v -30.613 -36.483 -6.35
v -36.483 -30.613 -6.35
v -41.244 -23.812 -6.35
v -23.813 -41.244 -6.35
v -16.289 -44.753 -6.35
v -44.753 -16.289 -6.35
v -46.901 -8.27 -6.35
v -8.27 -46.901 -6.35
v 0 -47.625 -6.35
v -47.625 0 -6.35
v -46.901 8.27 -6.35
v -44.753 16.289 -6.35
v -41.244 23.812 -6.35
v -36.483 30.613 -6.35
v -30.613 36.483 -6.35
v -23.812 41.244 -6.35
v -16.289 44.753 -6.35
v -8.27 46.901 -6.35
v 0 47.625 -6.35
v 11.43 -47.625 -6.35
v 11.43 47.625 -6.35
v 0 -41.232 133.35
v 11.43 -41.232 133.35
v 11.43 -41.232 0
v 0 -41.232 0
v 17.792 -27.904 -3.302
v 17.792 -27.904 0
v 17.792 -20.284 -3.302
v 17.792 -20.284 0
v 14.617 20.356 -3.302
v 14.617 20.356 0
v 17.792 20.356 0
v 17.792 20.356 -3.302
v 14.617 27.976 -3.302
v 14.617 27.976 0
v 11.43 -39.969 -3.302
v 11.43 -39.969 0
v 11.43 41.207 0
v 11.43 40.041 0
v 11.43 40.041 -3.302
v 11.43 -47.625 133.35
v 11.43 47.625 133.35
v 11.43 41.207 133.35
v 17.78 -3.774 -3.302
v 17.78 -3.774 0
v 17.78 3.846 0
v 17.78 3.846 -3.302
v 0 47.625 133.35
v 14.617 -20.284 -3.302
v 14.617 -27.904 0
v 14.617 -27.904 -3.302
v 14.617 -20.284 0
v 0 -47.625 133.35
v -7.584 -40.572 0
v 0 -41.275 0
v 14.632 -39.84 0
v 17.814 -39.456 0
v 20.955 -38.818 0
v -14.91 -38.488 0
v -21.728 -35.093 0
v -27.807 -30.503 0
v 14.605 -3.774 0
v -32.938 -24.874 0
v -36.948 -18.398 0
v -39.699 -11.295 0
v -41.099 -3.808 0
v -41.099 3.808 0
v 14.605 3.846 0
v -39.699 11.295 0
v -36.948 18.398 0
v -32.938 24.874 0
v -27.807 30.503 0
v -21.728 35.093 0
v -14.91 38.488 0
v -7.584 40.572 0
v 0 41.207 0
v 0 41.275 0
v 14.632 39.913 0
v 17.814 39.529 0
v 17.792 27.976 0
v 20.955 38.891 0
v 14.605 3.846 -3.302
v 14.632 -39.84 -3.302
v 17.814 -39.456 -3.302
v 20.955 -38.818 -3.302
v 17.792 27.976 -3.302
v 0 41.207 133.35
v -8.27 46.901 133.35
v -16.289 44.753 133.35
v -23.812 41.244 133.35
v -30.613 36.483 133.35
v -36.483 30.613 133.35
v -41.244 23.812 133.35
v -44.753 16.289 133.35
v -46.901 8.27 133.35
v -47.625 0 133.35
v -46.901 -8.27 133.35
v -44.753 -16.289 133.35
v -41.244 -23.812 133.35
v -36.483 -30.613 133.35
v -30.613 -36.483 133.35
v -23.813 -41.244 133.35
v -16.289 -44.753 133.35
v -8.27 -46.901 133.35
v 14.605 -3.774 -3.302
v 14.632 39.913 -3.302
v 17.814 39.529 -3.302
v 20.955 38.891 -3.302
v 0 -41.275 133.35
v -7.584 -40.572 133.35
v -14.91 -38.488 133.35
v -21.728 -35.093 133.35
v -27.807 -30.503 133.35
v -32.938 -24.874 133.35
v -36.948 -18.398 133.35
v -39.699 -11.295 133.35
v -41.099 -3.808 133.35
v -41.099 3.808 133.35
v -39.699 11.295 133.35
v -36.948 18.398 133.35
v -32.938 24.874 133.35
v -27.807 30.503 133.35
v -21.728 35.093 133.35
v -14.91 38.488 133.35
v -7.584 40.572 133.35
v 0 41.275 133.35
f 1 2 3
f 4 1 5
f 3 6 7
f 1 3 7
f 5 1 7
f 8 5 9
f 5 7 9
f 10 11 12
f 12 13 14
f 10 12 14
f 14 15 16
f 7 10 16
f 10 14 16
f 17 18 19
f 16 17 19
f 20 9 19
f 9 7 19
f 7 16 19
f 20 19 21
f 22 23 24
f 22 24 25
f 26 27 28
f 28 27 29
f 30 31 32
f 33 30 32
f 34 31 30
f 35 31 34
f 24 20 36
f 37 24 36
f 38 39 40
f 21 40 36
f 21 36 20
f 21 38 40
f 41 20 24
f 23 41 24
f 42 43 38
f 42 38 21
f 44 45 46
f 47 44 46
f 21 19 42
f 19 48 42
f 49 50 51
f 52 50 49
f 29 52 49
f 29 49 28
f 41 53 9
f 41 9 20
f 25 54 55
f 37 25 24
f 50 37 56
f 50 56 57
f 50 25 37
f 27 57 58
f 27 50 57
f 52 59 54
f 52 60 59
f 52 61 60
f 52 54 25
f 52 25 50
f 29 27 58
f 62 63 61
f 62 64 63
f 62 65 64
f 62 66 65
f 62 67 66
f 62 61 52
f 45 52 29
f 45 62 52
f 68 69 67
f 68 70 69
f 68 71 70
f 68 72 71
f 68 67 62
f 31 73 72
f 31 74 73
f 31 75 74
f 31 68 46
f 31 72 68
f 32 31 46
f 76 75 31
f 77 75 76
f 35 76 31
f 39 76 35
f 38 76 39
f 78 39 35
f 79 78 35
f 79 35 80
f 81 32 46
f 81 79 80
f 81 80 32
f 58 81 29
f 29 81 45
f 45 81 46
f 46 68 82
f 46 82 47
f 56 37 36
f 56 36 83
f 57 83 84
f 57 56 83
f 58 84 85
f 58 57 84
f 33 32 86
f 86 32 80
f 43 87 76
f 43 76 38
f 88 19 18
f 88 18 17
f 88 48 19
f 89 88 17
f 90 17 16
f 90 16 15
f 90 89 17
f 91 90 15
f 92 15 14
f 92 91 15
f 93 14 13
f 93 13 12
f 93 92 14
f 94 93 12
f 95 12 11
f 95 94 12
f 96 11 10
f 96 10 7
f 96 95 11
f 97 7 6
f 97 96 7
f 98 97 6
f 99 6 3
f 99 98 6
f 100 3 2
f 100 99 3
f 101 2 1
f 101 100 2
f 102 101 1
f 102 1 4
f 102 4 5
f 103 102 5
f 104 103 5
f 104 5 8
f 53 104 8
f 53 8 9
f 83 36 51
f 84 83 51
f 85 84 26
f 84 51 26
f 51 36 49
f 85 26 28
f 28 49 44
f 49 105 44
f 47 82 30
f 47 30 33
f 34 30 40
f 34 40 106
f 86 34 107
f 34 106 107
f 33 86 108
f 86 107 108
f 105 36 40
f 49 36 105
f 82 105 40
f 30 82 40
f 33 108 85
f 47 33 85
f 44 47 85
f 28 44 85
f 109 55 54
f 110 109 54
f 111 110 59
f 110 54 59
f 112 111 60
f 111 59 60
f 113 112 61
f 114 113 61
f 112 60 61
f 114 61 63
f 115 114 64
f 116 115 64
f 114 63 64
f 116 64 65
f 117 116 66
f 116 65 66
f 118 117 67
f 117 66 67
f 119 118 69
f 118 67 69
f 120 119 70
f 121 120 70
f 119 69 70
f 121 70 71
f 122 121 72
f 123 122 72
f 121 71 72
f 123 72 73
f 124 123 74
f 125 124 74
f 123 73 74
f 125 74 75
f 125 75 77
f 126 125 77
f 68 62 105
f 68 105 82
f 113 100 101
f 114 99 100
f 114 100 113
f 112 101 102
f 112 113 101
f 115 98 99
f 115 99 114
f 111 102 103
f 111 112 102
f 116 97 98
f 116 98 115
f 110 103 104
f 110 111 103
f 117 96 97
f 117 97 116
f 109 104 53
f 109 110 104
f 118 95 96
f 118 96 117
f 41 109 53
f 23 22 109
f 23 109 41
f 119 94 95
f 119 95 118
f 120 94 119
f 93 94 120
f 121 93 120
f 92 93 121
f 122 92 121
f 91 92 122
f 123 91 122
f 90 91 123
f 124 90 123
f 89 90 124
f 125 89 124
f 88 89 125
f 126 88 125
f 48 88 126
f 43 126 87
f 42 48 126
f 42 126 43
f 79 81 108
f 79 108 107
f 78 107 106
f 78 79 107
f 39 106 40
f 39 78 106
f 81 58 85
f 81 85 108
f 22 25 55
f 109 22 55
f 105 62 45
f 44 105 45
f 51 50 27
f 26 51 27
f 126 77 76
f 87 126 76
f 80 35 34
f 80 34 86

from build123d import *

# Parameters (mm, degrees)
F1_DEPTH = 133.35
F2_W     = 11.43
F2_H     = 95.25
F3_DEPTH = 6.35
F4_W     = 3.175
F4_H     = 7.62
F5_DEPTH = 3.302


with BuildPart() as f1:
    # F0 (on Top) → F1 (new body)
    with BuildSketch(Plane.XY):
        with BuildLine():
            Line((11.43, 47.625), (0, 47.625))
            ThreePointArc((0, 47.625), (-47.625, 0), (0, -47.625))
            Line((0, -47.625), (11.43, -47.625))
            Line((11.43, -47.625), (11.43, -41.232052))
            Line((11.43, -41.232052), (0, -41.232052))
            Line((0, -41.232052), (0, -41.275))
            ThreePointArc((0, -41.275), (-41.275, 0), (0, 41.275))
            Line((0, 41.275), (0, 41.207306))
            Line((0, 41.207306), (11.43, 41.207306))
            Line((11.43, 41.207306), (11.43, 47.625))
        make_face()
    extrude(amount=F1_DEPTH)

    # F2 (on Top) → F3 (join)
    with BuildSketch(Plane.XY):
        with BuildLine():
            Line((0, -47.625), (0, 47.625))
            ThreePointArc((0, 47.625), (-47.625, 0), (0, -47.625))
        make_face()
        with Locations((5.715, 0)):
            Rectangle(F2_W, F2_H)
    extrude(amount=-F3_DEPTH)

    # F4 (on face) → F5 (join)
    with BuildSketch(Plane.XY):
        with BuildLine():
            ThreePointArc((20.955, 38.890978), (16.227114, 39.752791), (11.43, 40.04145))
            Line((11.43, 40.04145), (11.43, -39.96855))
            ThreePointArc((11.43, -39.96855), (16.227114, -39.679891), (20.955, -38.818079))
            Line((20.955, -38.818079), (20.955, 38.890978))
        make_face()
        with Locations((16.204277, -24.09355)):
            Rectangle(F4_W, F4_H, mode=Mode.SUBTRACT)
        with Locations((16.1925, 0.03645)):
            Rectangle(F4_W, F4_H, mode=Mode.SUBTRACT)
        with Locations((16.204277, 24.16645)):
            Rectangle(F4_W, F4_H, mode=Mode.SUBTRACT)
    extrude(amount=-F5_DEPTH)


solid = f1.part
